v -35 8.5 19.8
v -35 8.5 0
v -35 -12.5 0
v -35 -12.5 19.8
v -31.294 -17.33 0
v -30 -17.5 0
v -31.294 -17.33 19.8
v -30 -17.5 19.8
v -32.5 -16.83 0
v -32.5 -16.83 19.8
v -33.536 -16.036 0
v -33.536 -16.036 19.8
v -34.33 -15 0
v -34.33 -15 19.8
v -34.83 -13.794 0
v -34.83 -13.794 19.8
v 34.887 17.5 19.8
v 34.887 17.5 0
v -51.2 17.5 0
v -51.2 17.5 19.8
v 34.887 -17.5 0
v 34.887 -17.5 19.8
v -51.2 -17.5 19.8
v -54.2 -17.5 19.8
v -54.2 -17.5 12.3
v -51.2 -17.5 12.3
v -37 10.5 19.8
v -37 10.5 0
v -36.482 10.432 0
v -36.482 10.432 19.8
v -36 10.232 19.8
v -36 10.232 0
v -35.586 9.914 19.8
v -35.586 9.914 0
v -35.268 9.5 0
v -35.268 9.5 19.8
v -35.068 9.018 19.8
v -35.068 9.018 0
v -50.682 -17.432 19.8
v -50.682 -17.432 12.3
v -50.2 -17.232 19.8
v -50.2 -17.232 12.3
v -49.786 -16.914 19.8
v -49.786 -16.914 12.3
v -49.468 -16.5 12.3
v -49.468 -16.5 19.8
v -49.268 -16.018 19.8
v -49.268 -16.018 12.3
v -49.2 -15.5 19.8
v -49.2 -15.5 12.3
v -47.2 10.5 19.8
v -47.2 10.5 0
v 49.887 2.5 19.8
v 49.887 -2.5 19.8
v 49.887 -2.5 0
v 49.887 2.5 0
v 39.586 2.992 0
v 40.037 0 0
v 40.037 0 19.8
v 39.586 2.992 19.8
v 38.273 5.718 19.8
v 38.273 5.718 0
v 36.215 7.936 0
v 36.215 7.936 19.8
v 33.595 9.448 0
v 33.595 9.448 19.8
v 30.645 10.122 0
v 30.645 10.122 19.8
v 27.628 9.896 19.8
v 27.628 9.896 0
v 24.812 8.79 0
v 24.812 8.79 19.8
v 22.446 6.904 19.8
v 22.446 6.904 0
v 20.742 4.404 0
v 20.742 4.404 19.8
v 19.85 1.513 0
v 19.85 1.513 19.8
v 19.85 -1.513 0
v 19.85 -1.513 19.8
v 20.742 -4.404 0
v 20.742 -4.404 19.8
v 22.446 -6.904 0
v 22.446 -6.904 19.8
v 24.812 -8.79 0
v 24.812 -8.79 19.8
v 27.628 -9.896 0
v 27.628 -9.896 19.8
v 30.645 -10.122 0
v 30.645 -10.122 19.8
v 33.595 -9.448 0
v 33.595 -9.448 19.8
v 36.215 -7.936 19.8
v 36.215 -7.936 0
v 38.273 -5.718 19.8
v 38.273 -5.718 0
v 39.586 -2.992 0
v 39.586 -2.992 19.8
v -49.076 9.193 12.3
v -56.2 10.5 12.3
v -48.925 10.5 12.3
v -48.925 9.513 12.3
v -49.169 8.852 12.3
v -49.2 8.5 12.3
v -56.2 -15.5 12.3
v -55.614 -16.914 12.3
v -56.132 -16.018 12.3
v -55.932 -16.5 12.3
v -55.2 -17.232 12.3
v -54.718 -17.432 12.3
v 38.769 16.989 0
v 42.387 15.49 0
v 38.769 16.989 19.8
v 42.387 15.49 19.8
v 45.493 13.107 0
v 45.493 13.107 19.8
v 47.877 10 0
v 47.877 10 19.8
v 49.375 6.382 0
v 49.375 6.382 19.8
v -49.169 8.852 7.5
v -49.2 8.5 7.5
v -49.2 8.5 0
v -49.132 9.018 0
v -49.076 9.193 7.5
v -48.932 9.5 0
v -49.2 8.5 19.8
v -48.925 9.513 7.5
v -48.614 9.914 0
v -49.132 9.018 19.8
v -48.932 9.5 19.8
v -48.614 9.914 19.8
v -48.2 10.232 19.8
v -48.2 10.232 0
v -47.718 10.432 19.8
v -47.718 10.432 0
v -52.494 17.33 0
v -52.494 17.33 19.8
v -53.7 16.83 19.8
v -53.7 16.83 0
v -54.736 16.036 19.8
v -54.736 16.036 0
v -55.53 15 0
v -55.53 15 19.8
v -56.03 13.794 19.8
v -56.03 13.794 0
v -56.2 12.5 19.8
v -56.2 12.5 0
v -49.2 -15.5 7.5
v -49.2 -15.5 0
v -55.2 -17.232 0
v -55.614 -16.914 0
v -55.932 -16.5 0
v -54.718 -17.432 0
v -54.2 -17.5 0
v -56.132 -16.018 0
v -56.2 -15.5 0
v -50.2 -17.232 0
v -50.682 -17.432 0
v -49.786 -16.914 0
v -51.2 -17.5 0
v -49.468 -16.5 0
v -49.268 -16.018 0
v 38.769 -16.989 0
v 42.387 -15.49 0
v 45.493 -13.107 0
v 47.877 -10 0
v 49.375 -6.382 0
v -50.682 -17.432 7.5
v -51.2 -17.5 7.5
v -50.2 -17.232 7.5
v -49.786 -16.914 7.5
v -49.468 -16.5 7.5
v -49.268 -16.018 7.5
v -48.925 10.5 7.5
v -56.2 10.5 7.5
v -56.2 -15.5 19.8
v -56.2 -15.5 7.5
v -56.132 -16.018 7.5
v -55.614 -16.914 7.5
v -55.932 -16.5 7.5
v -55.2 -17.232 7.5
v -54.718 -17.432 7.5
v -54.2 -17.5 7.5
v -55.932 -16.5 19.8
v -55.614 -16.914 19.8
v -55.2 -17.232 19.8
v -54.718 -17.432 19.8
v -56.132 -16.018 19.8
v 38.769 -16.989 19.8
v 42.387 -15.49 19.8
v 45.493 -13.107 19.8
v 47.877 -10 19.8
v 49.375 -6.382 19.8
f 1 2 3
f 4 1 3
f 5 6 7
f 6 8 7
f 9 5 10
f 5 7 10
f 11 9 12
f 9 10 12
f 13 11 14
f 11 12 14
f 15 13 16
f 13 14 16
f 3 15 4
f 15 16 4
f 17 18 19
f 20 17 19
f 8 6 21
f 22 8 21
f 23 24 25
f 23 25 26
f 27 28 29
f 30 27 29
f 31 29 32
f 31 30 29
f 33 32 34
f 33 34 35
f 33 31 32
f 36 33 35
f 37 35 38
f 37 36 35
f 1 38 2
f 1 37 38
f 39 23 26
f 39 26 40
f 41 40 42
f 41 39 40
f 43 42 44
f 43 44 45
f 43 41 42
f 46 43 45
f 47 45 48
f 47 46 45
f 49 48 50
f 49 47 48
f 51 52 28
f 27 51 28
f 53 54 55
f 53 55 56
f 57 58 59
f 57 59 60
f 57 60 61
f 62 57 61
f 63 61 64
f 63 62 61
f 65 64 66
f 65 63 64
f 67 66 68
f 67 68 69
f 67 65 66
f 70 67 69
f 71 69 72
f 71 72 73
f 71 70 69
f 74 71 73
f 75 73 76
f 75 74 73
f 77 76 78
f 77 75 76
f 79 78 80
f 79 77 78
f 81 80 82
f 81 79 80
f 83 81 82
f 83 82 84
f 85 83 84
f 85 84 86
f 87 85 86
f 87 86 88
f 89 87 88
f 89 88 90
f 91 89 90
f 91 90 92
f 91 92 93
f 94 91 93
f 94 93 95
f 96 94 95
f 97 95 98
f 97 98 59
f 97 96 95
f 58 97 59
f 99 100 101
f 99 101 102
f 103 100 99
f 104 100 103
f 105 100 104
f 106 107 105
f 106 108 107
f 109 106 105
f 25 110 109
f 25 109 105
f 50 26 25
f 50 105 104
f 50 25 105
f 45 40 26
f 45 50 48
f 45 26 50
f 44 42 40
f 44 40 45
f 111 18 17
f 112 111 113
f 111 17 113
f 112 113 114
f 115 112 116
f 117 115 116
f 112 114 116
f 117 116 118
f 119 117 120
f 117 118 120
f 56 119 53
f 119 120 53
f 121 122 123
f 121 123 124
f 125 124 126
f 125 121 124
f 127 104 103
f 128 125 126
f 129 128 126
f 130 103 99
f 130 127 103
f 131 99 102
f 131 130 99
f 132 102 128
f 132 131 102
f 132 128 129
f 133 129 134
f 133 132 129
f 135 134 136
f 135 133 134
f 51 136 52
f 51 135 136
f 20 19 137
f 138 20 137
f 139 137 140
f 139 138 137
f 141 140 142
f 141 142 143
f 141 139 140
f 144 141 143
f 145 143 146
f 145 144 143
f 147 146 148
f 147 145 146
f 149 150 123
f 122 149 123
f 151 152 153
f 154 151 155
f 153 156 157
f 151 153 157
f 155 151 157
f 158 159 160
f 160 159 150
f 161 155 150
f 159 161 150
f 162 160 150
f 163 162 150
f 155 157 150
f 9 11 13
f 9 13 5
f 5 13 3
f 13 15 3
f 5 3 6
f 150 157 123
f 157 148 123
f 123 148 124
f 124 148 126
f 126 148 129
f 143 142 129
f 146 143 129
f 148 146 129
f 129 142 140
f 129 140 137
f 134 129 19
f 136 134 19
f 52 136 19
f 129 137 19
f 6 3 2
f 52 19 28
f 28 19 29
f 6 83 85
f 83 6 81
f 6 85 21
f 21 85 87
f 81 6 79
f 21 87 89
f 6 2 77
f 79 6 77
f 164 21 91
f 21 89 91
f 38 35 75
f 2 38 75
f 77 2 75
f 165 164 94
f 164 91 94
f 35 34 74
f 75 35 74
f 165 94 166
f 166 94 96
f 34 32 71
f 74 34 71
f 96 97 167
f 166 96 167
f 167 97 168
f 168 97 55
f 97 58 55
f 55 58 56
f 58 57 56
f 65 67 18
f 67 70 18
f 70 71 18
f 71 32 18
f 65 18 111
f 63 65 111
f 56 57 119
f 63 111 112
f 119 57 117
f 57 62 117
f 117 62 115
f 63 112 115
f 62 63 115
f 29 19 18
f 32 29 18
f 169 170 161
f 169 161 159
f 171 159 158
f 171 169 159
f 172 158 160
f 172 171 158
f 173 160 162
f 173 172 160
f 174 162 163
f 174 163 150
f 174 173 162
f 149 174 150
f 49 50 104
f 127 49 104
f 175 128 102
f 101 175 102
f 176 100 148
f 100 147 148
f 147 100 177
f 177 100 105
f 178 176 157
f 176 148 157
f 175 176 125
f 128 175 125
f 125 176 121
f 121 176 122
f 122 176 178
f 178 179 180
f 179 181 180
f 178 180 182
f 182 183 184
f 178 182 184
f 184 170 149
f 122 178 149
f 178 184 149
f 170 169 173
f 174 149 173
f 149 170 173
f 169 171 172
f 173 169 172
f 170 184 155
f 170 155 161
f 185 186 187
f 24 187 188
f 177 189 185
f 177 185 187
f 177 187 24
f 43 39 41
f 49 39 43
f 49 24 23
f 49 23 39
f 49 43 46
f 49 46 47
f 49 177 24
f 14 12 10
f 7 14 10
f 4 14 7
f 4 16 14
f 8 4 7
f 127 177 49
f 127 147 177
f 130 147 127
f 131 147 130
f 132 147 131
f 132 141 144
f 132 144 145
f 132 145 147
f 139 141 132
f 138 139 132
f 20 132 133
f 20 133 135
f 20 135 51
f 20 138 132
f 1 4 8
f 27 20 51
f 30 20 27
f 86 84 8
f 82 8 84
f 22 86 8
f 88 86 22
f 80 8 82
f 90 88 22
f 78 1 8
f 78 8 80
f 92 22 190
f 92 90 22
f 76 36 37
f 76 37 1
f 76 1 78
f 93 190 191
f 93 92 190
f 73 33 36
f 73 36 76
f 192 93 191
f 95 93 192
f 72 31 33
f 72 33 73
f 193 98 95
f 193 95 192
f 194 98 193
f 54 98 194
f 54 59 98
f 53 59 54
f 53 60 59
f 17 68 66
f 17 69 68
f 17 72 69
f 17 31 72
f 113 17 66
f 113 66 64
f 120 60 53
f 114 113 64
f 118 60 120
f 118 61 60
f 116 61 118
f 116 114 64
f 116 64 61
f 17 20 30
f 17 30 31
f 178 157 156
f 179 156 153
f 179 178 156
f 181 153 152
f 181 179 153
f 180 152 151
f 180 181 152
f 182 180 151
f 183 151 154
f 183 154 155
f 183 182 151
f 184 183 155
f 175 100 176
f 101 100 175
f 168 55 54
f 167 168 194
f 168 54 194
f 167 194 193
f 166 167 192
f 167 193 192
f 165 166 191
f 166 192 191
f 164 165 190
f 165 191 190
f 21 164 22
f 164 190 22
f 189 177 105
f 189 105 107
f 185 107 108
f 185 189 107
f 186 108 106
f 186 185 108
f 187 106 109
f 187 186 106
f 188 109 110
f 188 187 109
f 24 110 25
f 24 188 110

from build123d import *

# Parameters (mm, degrees)
F0_R     = 10.15
F1_DEPTH = 19.8
F2_R     = 15
F3_R     = 5
F4_R     = 5
F5_R     = 2
F6_R     = 2
F7_W     = 7.765233
F7_H     = 2.4
F8_DEPTH = 28


with BuildPart() as f1:
    # F0 (on Top) → F1 (new body)
    with BuildSketch(Plane.XY):
        Polygon((-56.2, 17.5), (-56.2, -17.5), (-49.2, -17.5), (-49.2, 10.5), (-35, 10.5), (-35, -17.5), (49.886581, -17.5), (49.886581, 17.5), align=None)
        with Locations((29.886581, 0)):
            Circle(F0_R, mode=Mode.SUBTRACT)
    extrude(amount=F1_DEPTH)

    # F2
    f2_edges = [f1.edges().sort_by_distance(p)[0] for p in [
        (49.886581, 17.5, 9.9),
        (49.886581, -17.5, 9.9),
    ]]
    fillet(f2_edges, radius=F2_R)

    # F3
    f3_edges = [f1.edges().sort_by_distance(p)[0] for p in [
        (-35, -17.5, 9.9),
    ]]
    fillet(f3_edges, radius=F3_R)

    # F4
    f4_edges = [f1.edges().sort_by_distance(p)[0] for p in [
        (-56.2, 17.5, 9.9),
    ]]
    fillet(f4_edges, radius=F4_R)

    # F5
    f5_edges = [f1.edges().sort_by_distance(p)[0] for p in [
        (-49.2, -17.5, 9.9),
        (-56.2, -17.5, 9.9),
    ]]
    fillet(f5_edges, radius=F5_R)

    # F6
    f6_edges = [f1.edges().sort_by_distance(p)[0] for p in [
        (-49.2, 10.5, 9.9),
        (-35, 10.5, 9.9),
    ]]
    fillet(f6_edges, radius=F6_R)

    # F7 (on face) → F8 (cut, through all)
    with BuildSketch(Plane.XZ.offset(17.5)):
        with Locations((-52.807339, 11.1)):
            Rectangle(F7_W, F7_H)
        with Locations((-52.807339, 8.7)):
            Rectangle(F7_W, F7_H)
    extrude(amount=-F8_DEPTH, mode=Mode.SUBTRACT)


solid = f1.part
